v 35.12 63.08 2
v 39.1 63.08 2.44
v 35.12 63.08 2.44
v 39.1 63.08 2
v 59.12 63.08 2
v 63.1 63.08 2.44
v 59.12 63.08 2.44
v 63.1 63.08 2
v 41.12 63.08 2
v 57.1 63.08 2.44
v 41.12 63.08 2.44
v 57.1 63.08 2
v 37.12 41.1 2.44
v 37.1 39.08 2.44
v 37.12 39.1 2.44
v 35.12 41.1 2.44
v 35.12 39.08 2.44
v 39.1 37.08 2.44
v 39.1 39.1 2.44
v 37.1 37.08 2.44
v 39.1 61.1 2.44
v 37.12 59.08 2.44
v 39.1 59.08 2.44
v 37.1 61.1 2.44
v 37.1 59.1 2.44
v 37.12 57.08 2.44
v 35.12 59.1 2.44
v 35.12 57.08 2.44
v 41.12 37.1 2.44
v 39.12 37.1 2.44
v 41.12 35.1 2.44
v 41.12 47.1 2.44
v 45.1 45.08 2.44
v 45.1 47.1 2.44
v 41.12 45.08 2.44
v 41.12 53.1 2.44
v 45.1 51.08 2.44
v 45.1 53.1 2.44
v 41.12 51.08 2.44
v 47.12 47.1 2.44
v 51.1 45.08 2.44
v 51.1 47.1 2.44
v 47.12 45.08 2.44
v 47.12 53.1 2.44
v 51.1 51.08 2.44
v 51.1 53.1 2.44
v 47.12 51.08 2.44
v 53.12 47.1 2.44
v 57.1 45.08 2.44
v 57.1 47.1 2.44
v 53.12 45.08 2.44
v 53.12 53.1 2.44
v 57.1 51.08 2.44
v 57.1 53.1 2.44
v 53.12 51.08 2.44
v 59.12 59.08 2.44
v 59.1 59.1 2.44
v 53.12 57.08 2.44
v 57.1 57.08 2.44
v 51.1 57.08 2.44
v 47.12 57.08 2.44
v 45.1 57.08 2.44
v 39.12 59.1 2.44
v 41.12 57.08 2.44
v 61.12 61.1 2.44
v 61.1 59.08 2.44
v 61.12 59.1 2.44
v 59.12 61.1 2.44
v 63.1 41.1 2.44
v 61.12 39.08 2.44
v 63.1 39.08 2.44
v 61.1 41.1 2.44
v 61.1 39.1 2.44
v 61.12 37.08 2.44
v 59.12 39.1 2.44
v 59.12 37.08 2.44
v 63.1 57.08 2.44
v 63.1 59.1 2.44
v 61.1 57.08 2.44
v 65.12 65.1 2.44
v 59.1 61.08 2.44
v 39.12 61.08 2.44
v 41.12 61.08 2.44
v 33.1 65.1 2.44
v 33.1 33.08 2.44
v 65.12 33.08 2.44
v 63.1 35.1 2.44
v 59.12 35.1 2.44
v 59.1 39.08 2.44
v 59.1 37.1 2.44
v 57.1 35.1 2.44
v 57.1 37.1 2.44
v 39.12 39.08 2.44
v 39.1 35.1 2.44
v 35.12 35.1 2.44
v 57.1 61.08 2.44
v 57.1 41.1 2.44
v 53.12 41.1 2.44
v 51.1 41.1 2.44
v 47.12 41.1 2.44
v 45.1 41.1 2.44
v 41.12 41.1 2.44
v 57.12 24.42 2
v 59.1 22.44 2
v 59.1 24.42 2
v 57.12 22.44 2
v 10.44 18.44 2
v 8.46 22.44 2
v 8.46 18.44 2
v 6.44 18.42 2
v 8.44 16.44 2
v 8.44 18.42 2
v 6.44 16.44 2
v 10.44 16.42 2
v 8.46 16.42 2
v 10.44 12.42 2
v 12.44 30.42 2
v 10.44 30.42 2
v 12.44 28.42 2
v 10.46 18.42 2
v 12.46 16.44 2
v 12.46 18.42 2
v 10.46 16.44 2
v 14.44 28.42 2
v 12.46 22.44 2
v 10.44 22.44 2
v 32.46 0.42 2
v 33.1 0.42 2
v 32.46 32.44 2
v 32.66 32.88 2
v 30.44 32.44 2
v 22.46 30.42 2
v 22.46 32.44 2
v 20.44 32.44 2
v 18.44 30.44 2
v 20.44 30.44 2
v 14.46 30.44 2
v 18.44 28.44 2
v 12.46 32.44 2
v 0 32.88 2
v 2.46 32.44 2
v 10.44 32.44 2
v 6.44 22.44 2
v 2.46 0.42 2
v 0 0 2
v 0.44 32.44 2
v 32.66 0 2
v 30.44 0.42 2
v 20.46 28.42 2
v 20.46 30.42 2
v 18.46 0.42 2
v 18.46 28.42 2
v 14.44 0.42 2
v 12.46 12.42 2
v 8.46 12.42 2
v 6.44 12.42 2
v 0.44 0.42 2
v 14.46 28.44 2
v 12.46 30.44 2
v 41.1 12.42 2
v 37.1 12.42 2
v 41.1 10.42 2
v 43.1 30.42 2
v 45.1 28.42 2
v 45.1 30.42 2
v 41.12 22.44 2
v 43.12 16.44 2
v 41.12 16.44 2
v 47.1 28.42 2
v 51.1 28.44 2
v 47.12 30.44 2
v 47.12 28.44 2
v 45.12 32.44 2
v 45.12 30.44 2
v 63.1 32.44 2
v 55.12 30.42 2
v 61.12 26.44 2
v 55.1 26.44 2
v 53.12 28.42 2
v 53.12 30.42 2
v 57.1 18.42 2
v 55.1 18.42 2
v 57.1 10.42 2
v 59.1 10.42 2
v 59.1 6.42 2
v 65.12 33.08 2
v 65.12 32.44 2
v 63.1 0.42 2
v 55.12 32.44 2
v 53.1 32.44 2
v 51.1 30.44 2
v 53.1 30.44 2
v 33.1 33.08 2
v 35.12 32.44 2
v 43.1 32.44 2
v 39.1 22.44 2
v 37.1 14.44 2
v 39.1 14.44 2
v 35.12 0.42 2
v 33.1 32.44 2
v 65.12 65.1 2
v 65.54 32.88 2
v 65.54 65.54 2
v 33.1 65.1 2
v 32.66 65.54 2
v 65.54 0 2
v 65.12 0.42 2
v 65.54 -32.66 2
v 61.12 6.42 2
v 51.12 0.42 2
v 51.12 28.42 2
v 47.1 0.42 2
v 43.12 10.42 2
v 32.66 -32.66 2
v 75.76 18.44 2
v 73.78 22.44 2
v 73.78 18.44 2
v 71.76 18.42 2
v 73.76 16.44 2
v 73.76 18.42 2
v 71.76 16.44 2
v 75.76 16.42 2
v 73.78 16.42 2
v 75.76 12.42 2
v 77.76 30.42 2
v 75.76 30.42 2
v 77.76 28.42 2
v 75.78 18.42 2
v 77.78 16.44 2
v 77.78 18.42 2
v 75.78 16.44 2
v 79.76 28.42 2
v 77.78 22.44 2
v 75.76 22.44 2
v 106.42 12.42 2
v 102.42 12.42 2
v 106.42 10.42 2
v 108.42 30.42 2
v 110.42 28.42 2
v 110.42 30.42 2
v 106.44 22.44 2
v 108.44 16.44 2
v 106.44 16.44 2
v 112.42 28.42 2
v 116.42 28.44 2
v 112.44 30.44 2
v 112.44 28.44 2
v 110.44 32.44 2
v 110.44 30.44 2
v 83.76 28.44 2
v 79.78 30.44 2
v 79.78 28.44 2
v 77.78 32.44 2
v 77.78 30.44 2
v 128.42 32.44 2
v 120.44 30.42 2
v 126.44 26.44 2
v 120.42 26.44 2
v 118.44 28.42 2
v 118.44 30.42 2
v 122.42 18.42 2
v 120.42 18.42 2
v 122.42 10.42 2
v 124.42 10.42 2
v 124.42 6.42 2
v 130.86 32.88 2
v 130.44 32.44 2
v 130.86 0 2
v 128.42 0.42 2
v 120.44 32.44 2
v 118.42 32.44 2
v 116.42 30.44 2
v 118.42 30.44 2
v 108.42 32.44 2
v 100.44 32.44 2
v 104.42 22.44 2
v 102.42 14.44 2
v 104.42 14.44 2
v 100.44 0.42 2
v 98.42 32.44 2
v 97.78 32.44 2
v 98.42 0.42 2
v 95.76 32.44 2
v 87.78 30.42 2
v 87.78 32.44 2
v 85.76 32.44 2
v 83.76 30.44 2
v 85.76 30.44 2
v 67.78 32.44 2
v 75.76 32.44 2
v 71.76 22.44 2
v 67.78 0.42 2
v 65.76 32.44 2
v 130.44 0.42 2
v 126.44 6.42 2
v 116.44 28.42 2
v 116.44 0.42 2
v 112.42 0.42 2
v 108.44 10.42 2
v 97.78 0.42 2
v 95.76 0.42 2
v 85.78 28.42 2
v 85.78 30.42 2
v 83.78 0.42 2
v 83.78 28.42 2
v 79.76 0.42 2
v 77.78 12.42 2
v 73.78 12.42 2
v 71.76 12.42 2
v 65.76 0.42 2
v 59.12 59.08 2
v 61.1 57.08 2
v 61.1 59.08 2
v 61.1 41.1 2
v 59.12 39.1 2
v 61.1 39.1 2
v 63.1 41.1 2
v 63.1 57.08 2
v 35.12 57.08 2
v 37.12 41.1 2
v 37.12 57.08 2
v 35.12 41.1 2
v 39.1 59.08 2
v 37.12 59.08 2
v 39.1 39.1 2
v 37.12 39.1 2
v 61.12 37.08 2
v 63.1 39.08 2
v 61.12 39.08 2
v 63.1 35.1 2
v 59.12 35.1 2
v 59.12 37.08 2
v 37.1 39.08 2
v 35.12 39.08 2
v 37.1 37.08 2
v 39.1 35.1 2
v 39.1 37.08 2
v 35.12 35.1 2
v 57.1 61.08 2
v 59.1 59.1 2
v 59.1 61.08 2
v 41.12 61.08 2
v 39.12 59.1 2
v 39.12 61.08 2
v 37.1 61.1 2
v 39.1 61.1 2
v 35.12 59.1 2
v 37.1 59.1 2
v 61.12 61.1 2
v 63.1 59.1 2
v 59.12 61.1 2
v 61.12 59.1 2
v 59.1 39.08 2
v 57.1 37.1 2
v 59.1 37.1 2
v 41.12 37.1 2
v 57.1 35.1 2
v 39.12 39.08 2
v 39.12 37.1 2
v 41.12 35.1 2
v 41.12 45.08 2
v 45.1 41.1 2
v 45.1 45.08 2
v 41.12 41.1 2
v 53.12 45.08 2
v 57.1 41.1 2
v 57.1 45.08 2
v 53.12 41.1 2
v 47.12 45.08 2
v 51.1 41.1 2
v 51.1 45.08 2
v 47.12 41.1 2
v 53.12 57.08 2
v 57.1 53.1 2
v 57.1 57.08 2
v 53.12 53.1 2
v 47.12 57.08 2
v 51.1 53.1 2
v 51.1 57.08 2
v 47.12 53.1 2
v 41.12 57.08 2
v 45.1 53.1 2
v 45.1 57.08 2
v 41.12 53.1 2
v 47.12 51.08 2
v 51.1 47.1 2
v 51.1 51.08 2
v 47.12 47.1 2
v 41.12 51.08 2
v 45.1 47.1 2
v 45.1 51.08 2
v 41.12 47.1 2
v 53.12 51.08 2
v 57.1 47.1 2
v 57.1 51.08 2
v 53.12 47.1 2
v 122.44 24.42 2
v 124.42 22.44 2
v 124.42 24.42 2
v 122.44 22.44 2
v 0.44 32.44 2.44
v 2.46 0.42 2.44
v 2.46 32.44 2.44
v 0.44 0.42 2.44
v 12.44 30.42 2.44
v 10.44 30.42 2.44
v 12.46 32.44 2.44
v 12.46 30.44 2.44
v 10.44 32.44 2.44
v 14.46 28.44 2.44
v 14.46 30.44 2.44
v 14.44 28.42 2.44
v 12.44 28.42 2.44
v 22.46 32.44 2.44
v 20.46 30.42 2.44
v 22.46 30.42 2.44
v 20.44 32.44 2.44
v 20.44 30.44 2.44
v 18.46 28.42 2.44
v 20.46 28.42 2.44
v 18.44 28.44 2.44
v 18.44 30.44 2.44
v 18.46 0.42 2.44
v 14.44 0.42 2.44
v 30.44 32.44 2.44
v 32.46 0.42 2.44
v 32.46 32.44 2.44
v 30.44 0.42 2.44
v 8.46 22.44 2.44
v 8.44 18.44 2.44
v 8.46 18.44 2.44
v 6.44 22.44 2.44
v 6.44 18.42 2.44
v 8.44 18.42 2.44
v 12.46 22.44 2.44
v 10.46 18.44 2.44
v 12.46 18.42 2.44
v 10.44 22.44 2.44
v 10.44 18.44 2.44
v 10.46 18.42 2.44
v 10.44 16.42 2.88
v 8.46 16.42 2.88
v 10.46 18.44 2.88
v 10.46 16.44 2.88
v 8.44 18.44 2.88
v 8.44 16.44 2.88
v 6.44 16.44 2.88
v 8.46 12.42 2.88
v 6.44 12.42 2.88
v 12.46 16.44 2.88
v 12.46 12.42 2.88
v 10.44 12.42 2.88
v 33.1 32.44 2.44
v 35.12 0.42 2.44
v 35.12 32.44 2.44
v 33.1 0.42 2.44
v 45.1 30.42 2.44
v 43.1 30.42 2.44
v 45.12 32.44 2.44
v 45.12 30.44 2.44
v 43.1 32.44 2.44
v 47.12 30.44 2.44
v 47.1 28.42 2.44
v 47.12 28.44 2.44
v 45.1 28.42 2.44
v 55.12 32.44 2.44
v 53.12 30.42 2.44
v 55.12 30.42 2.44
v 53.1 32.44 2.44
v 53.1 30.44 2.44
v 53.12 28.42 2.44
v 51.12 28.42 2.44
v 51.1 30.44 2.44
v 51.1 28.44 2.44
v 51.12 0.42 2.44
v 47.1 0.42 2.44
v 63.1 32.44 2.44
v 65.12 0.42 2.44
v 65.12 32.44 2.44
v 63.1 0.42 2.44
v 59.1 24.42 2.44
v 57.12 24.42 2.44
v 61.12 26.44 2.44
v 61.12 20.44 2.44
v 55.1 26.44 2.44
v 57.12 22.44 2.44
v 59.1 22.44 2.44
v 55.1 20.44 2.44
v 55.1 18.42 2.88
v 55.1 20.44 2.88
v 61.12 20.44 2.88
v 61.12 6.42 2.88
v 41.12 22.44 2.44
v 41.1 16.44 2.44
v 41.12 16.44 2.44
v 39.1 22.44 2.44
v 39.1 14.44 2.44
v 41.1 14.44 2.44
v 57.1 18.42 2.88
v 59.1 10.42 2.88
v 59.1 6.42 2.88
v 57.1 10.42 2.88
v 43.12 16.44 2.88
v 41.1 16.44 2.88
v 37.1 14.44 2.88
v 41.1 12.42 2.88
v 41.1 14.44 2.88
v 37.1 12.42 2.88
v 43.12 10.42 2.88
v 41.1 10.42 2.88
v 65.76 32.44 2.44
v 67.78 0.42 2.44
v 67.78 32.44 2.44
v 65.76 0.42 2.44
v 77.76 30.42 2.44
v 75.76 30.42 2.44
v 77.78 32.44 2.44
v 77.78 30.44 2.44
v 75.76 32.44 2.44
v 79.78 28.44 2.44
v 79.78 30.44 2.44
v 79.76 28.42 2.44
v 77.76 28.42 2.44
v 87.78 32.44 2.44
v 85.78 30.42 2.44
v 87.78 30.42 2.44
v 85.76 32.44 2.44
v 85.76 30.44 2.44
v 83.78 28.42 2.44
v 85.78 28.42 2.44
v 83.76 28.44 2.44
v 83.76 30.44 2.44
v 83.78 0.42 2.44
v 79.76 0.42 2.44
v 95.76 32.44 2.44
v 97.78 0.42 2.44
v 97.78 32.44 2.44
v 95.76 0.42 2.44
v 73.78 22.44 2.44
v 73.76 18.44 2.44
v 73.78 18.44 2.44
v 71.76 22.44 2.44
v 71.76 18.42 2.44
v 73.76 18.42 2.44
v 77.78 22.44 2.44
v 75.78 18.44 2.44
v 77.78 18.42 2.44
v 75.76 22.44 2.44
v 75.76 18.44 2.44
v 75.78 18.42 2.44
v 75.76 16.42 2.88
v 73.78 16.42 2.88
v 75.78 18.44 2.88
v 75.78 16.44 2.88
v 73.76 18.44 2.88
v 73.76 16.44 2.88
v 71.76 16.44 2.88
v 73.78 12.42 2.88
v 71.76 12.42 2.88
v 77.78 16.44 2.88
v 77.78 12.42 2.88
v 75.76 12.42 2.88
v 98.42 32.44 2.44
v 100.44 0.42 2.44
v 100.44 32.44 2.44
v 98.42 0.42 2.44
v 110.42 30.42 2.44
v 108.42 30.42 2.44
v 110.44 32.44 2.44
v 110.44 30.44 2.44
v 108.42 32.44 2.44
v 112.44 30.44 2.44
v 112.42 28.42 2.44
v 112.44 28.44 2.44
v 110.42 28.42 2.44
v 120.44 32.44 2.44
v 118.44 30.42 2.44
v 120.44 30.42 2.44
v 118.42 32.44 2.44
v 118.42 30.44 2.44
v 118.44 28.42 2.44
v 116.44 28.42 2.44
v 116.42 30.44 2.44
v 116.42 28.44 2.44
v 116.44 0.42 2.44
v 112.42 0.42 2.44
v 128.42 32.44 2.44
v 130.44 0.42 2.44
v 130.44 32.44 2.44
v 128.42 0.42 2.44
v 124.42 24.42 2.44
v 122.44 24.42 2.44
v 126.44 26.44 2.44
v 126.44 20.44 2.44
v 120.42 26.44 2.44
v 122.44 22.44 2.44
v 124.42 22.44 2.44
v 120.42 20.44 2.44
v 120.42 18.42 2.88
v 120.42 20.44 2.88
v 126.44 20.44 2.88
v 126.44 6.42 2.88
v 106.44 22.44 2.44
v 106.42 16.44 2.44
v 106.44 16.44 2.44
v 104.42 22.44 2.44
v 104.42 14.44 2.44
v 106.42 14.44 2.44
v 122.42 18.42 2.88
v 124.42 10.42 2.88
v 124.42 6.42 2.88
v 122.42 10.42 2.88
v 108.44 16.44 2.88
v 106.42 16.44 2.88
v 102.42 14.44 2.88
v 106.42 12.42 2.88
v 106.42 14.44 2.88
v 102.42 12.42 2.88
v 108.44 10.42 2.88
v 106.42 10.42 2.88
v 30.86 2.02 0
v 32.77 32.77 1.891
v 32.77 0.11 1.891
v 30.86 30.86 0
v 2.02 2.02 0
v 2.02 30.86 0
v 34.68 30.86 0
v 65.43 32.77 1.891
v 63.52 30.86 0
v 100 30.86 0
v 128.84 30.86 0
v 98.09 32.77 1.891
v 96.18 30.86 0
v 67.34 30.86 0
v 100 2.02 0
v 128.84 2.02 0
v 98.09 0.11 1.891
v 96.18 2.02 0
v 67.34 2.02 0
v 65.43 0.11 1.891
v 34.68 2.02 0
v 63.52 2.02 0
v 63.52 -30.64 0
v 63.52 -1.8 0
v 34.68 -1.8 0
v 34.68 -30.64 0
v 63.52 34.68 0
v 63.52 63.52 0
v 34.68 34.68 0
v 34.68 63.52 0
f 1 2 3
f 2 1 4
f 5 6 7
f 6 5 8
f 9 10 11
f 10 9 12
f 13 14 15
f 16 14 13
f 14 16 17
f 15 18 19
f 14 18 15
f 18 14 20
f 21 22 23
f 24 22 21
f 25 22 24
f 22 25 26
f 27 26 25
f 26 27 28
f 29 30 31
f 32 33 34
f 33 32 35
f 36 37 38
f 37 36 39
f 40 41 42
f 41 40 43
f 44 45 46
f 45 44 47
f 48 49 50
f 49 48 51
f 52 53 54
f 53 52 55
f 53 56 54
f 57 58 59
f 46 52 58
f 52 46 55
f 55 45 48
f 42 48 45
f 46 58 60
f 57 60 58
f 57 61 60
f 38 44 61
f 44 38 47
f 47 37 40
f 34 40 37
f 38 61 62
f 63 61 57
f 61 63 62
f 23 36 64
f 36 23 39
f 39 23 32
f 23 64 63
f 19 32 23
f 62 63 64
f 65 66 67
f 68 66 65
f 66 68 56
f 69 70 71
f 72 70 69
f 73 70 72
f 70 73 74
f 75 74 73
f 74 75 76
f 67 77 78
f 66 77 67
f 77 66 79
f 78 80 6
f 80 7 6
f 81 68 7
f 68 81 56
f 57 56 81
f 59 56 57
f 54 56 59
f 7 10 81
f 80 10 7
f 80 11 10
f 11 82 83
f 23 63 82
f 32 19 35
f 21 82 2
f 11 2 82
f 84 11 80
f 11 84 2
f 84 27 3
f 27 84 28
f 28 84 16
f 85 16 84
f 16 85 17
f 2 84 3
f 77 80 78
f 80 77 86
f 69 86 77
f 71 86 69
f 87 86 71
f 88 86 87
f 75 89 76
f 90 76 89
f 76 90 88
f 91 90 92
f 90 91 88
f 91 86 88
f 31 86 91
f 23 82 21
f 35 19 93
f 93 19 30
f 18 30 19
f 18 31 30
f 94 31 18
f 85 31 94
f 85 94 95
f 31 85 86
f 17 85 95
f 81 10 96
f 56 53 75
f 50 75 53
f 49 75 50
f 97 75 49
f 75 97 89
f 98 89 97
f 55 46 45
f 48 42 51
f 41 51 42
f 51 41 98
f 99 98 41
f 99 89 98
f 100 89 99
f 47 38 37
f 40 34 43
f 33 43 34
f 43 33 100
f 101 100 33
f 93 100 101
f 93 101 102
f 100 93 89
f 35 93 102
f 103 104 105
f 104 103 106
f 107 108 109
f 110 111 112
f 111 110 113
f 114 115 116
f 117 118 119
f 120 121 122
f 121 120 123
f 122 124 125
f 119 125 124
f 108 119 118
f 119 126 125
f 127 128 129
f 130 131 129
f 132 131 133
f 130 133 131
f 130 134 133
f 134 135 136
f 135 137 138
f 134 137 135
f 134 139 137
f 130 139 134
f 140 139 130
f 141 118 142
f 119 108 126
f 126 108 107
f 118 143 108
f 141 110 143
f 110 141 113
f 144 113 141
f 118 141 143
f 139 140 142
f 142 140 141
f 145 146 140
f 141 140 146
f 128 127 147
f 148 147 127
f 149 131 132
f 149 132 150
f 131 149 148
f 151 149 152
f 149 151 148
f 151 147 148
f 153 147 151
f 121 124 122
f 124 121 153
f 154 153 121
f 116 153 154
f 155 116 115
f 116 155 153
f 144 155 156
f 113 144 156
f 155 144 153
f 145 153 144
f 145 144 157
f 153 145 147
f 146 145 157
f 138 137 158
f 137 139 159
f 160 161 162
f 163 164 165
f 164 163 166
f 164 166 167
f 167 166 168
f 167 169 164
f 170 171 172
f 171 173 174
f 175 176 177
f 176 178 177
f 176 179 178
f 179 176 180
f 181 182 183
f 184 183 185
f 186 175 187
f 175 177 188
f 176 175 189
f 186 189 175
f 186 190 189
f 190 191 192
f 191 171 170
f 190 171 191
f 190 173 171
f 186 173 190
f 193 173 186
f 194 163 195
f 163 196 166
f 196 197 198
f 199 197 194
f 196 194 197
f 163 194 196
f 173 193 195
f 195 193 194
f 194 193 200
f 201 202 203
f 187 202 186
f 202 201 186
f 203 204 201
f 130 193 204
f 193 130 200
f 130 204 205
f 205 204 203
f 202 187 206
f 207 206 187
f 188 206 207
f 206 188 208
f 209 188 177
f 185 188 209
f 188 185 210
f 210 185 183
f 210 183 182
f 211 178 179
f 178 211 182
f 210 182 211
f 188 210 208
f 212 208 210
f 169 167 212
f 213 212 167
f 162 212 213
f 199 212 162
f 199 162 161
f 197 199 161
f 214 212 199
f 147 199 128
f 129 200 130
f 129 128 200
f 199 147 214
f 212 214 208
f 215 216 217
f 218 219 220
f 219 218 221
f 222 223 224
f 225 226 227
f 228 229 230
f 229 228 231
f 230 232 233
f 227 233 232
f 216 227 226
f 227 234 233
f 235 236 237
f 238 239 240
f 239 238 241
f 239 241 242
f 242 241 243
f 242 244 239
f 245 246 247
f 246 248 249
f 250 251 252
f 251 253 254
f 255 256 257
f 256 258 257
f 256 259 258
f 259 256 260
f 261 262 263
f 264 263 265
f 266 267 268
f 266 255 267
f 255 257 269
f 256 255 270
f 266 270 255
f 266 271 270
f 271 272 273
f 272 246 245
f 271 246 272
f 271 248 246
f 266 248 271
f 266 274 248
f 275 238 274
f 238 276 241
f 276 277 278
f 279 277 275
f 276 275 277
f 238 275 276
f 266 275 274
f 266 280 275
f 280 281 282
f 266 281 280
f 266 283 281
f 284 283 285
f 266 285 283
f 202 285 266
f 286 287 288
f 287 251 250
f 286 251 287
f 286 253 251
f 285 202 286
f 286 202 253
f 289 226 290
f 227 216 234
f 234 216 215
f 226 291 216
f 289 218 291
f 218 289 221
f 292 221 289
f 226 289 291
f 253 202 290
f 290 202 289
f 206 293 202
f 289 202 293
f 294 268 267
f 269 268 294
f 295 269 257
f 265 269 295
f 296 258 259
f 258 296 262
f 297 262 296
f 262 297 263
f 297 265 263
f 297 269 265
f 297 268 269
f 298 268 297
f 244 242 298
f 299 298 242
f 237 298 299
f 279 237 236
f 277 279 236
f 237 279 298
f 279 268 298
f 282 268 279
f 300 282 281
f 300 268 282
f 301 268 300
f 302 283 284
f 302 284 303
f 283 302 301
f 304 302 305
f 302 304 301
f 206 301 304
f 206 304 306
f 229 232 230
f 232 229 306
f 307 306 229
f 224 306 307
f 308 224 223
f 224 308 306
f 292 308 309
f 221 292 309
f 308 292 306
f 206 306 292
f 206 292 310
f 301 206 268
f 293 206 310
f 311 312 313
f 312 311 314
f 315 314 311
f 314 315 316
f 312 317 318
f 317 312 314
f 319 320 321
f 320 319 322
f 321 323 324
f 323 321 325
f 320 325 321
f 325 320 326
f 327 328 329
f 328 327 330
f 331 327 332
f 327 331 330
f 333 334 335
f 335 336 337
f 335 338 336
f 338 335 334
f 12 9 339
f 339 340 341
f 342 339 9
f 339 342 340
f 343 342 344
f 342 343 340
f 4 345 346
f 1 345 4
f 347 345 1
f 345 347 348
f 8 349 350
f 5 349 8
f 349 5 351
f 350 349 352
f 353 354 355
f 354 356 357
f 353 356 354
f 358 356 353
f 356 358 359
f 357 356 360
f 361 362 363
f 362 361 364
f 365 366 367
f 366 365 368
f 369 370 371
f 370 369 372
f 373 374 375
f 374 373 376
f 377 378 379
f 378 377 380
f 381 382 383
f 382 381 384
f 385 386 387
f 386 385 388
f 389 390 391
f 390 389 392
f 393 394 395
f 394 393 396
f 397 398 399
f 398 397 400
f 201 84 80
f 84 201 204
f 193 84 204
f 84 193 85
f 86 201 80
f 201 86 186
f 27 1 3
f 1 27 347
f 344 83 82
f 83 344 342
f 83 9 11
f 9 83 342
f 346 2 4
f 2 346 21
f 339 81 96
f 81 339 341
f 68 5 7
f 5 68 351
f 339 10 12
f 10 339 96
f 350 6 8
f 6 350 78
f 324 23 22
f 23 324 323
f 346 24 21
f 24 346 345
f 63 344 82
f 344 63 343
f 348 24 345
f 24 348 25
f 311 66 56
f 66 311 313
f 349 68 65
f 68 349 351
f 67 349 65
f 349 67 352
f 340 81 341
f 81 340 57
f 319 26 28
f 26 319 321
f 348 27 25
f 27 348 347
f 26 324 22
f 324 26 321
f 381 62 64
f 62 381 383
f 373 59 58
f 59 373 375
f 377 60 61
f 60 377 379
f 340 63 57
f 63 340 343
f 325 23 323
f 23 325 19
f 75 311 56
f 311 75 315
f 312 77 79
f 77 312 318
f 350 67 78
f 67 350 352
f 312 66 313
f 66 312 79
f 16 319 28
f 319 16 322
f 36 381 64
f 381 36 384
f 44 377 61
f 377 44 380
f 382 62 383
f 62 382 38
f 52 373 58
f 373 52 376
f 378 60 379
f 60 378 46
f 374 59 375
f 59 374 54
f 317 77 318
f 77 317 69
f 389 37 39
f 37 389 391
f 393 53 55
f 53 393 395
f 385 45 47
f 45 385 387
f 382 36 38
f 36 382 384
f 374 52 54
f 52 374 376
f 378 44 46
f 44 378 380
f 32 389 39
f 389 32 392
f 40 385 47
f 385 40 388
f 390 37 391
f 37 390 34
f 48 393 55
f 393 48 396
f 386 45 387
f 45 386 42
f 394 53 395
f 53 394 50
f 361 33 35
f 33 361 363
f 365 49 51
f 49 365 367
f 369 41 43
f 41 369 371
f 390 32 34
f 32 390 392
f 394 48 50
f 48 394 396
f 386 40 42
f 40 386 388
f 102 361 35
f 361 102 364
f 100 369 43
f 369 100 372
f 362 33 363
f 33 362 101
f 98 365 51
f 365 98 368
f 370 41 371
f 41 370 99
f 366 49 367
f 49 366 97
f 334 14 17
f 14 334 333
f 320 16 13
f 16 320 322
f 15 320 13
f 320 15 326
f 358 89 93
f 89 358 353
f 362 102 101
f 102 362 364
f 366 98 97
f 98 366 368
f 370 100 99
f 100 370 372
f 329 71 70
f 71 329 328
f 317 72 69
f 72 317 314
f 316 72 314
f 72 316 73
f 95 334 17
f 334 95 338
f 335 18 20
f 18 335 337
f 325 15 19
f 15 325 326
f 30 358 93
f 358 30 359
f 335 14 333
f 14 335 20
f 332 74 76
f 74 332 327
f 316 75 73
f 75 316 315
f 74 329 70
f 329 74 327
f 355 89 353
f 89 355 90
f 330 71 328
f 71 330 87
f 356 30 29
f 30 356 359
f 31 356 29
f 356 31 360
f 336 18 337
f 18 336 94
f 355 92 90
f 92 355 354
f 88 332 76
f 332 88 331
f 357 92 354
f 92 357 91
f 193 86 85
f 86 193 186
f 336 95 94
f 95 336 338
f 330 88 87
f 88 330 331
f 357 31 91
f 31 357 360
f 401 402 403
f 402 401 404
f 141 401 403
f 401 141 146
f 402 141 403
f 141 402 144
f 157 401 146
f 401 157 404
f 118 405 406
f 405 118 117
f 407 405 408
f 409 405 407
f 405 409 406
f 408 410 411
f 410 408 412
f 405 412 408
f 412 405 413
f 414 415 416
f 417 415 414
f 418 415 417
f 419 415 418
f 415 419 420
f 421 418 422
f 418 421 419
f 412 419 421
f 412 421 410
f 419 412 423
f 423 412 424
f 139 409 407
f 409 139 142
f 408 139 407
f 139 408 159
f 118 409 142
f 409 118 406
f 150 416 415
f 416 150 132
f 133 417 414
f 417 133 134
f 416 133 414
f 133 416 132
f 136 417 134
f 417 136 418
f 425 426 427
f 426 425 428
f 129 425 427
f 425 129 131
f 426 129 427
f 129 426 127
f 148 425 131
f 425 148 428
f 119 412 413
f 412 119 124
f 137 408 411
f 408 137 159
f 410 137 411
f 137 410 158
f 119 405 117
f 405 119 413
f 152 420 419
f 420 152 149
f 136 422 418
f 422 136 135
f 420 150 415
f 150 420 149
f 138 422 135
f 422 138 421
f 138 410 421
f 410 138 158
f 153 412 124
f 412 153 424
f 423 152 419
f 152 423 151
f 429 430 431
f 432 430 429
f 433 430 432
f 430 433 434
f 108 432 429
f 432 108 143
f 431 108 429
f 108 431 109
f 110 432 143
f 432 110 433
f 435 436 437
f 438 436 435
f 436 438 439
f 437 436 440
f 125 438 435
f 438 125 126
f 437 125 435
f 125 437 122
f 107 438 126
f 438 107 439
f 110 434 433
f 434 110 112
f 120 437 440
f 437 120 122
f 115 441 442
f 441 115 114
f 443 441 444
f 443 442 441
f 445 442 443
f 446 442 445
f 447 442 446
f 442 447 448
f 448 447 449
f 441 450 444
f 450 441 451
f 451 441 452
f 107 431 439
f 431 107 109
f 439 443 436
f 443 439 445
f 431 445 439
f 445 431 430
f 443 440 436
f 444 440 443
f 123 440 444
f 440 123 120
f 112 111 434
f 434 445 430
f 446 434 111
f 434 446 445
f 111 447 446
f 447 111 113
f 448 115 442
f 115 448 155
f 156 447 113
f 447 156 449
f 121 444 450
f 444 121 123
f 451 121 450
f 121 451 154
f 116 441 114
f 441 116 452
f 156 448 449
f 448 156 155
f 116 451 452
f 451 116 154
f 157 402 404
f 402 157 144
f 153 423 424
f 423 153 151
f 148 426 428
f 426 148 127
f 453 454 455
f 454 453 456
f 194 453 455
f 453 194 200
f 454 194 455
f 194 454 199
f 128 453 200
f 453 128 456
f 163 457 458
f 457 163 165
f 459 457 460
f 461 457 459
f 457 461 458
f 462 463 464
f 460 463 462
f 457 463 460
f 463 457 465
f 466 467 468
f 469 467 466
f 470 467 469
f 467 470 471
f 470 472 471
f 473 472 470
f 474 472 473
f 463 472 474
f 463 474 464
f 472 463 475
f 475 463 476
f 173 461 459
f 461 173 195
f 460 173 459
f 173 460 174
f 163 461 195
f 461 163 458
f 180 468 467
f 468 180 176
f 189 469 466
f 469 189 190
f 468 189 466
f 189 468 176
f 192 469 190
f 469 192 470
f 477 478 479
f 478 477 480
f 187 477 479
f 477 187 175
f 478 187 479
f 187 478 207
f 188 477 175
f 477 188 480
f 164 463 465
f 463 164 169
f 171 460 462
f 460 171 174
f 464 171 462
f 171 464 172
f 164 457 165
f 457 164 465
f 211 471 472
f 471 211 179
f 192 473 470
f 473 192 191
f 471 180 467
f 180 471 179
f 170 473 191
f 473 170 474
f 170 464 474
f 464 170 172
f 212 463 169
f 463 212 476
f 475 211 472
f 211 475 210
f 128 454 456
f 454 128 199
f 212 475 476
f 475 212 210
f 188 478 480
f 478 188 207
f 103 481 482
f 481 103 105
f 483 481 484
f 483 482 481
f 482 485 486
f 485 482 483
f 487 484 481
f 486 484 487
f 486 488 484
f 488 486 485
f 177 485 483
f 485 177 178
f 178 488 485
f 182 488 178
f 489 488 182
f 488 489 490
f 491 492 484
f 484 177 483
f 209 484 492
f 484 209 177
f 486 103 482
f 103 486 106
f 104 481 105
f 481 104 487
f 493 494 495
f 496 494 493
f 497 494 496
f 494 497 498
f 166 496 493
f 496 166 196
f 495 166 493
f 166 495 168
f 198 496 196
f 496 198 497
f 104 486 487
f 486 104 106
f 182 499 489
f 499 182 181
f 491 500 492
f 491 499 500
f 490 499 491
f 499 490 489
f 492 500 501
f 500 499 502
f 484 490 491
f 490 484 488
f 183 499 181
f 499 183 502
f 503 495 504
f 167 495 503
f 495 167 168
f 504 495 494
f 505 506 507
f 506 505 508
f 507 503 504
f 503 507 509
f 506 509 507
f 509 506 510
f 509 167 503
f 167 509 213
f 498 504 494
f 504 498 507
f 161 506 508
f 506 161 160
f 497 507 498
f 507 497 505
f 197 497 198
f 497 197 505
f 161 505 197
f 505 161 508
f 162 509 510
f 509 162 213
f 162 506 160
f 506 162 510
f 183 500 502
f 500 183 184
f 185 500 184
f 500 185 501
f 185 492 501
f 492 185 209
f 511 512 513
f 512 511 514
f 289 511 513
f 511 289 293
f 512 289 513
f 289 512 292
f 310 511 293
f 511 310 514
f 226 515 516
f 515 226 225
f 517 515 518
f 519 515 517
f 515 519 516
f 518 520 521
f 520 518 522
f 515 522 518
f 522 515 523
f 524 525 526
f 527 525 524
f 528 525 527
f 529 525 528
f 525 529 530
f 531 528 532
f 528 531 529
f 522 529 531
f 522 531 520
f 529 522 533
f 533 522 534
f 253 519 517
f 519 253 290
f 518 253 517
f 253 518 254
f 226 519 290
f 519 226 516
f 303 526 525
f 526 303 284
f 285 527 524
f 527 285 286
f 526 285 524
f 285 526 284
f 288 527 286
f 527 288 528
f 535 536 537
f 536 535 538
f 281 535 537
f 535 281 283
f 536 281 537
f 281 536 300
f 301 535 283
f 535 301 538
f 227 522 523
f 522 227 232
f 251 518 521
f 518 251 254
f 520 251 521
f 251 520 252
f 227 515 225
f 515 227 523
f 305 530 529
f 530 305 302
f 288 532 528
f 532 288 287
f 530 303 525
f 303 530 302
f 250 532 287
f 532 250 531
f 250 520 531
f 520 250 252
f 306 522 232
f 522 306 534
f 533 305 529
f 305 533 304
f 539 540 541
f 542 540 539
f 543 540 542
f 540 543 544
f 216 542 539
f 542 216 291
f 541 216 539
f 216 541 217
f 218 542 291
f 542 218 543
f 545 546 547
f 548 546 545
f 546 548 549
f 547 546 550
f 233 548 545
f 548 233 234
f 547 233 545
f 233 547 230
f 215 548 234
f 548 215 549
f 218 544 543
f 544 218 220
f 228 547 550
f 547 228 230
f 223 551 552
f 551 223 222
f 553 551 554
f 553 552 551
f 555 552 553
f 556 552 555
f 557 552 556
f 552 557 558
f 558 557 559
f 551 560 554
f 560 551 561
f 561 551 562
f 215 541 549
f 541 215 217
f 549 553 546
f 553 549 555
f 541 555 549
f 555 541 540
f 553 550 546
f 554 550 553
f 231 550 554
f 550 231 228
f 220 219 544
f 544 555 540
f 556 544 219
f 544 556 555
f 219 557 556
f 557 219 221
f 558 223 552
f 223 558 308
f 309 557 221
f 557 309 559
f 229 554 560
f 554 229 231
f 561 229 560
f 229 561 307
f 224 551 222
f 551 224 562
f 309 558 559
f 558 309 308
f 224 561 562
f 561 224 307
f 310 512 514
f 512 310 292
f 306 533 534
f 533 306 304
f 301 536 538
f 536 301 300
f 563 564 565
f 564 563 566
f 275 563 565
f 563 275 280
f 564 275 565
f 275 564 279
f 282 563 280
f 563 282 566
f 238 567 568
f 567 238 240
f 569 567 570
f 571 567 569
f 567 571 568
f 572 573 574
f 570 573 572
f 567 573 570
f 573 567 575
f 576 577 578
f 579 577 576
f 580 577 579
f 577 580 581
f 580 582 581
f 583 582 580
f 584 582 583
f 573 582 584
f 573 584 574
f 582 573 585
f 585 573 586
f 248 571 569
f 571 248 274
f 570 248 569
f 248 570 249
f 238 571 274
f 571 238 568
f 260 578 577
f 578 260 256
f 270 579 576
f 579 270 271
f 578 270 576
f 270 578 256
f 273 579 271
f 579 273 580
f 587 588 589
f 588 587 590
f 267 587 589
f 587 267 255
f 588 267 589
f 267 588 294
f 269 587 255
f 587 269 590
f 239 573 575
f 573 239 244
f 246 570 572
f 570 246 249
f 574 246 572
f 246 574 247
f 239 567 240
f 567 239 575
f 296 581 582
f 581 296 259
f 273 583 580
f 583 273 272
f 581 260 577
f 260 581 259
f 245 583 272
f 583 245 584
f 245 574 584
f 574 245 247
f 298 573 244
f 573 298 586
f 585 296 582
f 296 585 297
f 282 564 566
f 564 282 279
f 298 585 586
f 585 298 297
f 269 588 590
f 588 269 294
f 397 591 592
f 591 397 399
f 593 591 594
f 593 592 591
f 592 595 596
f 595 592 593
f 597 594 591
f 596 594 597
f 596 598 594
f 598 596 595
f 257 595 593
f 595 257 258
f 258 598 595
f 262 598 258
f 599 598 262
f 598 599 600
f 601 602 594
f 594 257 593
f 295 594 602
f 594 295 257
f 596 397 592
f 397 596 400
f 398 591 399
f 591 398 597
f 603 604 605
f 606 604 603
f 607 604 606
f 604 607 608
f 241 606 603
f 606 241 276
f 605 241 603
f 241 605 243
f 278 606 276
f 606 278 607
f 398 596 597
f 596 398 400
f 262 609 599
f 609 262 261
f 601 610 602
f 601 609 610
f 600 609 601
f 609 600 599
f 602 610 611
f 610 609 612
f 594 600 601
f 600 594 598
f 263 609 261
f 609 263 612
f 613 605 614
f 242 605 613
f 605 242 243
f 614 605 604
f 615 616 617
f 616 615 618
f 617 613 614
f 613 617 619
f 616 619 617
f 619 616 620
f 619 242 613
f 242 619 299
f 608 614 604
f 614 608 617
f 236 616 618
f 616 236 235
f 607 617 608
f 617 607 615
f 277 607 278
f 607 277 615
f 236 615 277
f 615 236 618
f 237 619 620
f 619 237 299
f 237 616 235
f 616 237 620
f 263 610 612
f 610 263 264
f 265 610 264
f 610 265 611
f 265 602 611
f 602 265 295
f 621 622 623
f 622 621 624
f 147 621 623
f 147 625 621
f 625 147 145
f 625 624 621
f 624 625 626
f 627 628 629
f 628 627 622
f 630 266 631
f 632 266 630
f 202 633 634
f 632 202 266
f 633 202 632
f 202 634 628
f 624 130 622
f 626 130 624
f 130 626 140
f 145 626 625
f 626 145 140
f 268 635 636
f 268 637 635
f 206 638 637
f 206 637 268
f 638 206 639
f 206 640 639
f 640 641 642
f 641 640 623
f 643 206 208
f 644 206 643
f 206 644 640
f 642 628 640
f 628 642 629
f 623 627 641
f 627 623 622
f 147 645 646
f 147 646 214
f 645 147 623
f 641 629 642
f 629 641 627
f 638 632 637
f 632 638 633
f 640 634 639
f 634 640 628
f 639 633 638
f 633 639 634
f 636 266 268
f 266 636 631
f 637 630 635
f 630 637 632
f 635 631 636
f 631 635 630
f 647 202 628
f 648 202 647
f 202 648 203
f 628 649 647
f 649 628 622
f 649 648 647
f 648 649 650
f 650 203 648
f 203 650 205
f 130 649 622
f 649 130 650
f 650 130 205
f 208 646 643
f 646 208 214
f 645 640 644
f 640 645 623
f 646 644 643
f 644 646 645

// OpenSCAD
/*
Inspired by:
* http://www.thingiverse.com/thing:1366519
* http://www.thingiverse.com/thing:75093
And using this for the pixels:
* https://img.clipartfest.com/d67569bec5b8d1f25282946c07801aa1_minecraft-paper-crafting-table-free-clipart-minecraft-crafting-table_564-457.jpeg
*/

layer_height=.22;

pixel_width=2;
panel_angle_degrees=35;

/* [Hidden] */
buffer=layer_height*2;
colors=["tan","black","white"];
height=[0,layer_height*2,layer_height*4];
pixels=16;
panel_width=pixels*pixel_width+buffer*2;

top=[
/* 01 */ [1,1,1,1,1,1,1,1,1,1,1,1,1,1,1,1],
/* 02 */ [1,0,0,1,0,0,0,0,0,0,0,0,1,0,0,1],
/* 03 */ [1,0,1,0,0,0,0,0,0,0,0,0,0,1,0,1],
/* 04 */ [1,1,0,1,1,1,1,1,1,1,1,1,1,0,1,1],
/* 05 */ [1,0,0,1,0,0,1,0,0,1,0,0,1,0,0,1],
/* 06 */ [1,0,0,1,0,0,1,0,0,1,0,0,1,0,0,1],
/* 07 */ [1,0,0,1,1,1,1,1,1,1,1,1,1,0,0,1],
/* 08 */ [1,0,0,1,0,0,1,0,0,1,0,0,1,0,0,1],
/* 09 */ [1,0,0,1,0,0,1,0,0,1,0,0,1,0,0,1],
/* 10 */ [1,0,0,1,1,1,1,1,1,1,1,1,1,0,0,1],
/* 11 */ [1,0,0,1,0,0,1,0,0,1,0,0,1,0,0,1],
/* 12 */ [1,0,0,1,0,0,1,0,0,1,0,0,1,0,0,1],
/* 13 */ [1,1,0,1,1,1,1,1,1,1,1,1,1,0,1,1],
/* 14 */ [1,0,1,0,0,0,0,0,0,0,0,0,0,1,0,1],
/* 15 */ [1,0,0,1,0,0,0,0,0,0,0,0,1,0,0,1],
/* 16 */ [1,1,1,1,1,1,1,1,1,1,1,1,1,1,1,1]
];

side1=[
/* 01 */ [1,0,0,0,0,1,0,0,0,0,1,0,0,0,0,1],
/* 02 */ [1,0,0,0,0,0,1,0,0,1,0,0,0,0,0,1],
/* 03 */ [1,0,0,0,0,0,0,1,1,0,0,0,0,0,0,1],
/* 04 */ [1,0,0,0,0,0,0,1,1,0,0,0,0,0,0,1],
/* 05 */ [1,0,0,0,0,0,0,1,1,0,0,0,0,0,0,1],
/* 06 */ [1,0,0,1,0,1,0,1,1,0,0,0,0,0,0,1],
/* 07 */ [1,0,0,1,0,1,0,1,1,0,0,0,0,0,0,1],
/* 08 */ [1,0,0,0,2,0,0,1,1,0,0,0,0,0,0,1],
/* 09 */ [1,0,0,2,0,2,0,1,1,0,0,0,0,0,0,1],
/* 10 */ [1,0,0,2,0,2,0,1,1,0,0,0,0,0,0,1],
/* 11 */ [1,0,0,0,0,0,0,1,1,0,0,0,0,0,0,1],
/* 12 */ [1,0,0,0,0,0,0,1,1,0,0,0,0,0,0,1],
/* 13 */ [1,0,0,0,0,0,0,1,1,0,0,0,0,0,0,1],
/* 14 */ [1,0,0,0,0,0,0,1,1,0,0,0,0,0,0,1],
/* 15 */ [1,0,0,0,0,0,0,1,1,0,0,0,0,0,0,1],
/* 16 */ [1,0,0,0,0,0,0,1,1,0,0,0,0,0,0,1]
];

side2=[
/* 01 */ [1,0,0,0,0,1,0,0,0,0,1,0,0,0,0,1],
/* 02 */ [1,0,0,0,0,0,1,0,0,1,0,0,0,0,0,1],
/* 03 */ [1,0,0,0,0,0,0,1,1,0,0,0,0,0,0,1],
/* 04 */ [1,0,0,0,0,0,0,1,1,0,0,1,1,1,0,1],
/* 05 */ [1,0,0,0,0,0,0,1,1,0,0,1,0,1,0,1],
/* 06 */ [1,0,0,1,0,0,0,1,1,0,0,1,1,1,0,1],
/* 07 */ [1,0,0,1,0,0,0,1,1,0,0,2,2,2,0,1],
/* 08 */ [1,0,0,1,0,0,0,1,1,0,0,0,2,2,0,1],
/* 09 */ [1,0,0,1,2,0,0,1,1,0,0,0,2,2,0,1],
/* 10 */ [1,0,2,2,2,0,0,1,1,0,0,0,2,2,0,1],
/* 11 */ [1,0,0,0,2,0,0,1,1,0,0,0,2,2,0,1],
/* 12 */ [1,0,0,0,0,0,0,1,1,0,0,0,0,2,0,1],
/* 13 */ [1,0,0,0,0,0,0,1,1,0,0,0,0,2,0,1],
/* 14 */ [1,0,0,0,0,0,0,1,1,0,0,0,0,0,0,1],
/* 15 */ [1,0,0,0,0,0,0,1,1,0,0,0,0,0,0,1],
/* 16 */ [1,0,0,0,0,0,0,1,1,0,0,0,0,0,0,1]
];

module render_panel(data) {
    translate([0,pixels*pixel_width,0]) rotate(-90)
    for (y=[0:len(data)-1]) {
        row=data[y];
        for (x=[0:len(row)-1]) {
            i=data[y][x];
            h=height[i];
            if (h!=0) {
                c=colors[i];
                w=pixel_width*1.01; // slightly bigger so they overlap
                translate([y*pixel_width,x*pixel_width,0]) color(c) cube([w,w,h]);
            }
        }
    }
}

module panel_base() {
    o=pixel_width;
    // a=adjacent side
    // o=opposite side
    // therefore:
    a=o/tan(panel_angle_degrees);
        
    // using cylinder, therefore top radius is hypotenuse of right trangle where adjacent and opposite sides are 1/2 of desired panel width and bottom radius is top radius minus "a" from above
    z=panel_width/2;
    r2=sqrt(z*z+z*z);
    r1=r2-a;
    h=o;
    color(colors[0]) translate([z,z,0]) rotate(45) cylinder(h=h, r1=r1, r2=r2, $fn=4);
}

module crafting_table() {
    union() {
        p=panel_width-layer_height;
        b=buffer;
        z=pixel_width;

        panel_base();
        translate([p,0,0]) panel_base();
        translate([p*2,0,0]) panel_base();
        translate([p*3,0,0]) panel_base();
        translate([p,p,0]) panel_base();
        translate([p,-p,0]) panel_base();

        translate([p+b,p+b,z]) render_panel(top);
        translate([b,b,z]) render_panel(side1);
        translate([p+b,b,z]) render_panel(side2);
        translate([p*2+b,b,z]) render_panel(side1);
        translate([p*3+b,b,z]) render_panel(side2);
    }
}

module test() {
    s=2;
    intersection(){
        crafting_table();
        translate([panel_width,panel_width,0]) cube([panel_width/s,panel_width/s,pixel_width*4], center=true);
    }
}

crafting_table();
